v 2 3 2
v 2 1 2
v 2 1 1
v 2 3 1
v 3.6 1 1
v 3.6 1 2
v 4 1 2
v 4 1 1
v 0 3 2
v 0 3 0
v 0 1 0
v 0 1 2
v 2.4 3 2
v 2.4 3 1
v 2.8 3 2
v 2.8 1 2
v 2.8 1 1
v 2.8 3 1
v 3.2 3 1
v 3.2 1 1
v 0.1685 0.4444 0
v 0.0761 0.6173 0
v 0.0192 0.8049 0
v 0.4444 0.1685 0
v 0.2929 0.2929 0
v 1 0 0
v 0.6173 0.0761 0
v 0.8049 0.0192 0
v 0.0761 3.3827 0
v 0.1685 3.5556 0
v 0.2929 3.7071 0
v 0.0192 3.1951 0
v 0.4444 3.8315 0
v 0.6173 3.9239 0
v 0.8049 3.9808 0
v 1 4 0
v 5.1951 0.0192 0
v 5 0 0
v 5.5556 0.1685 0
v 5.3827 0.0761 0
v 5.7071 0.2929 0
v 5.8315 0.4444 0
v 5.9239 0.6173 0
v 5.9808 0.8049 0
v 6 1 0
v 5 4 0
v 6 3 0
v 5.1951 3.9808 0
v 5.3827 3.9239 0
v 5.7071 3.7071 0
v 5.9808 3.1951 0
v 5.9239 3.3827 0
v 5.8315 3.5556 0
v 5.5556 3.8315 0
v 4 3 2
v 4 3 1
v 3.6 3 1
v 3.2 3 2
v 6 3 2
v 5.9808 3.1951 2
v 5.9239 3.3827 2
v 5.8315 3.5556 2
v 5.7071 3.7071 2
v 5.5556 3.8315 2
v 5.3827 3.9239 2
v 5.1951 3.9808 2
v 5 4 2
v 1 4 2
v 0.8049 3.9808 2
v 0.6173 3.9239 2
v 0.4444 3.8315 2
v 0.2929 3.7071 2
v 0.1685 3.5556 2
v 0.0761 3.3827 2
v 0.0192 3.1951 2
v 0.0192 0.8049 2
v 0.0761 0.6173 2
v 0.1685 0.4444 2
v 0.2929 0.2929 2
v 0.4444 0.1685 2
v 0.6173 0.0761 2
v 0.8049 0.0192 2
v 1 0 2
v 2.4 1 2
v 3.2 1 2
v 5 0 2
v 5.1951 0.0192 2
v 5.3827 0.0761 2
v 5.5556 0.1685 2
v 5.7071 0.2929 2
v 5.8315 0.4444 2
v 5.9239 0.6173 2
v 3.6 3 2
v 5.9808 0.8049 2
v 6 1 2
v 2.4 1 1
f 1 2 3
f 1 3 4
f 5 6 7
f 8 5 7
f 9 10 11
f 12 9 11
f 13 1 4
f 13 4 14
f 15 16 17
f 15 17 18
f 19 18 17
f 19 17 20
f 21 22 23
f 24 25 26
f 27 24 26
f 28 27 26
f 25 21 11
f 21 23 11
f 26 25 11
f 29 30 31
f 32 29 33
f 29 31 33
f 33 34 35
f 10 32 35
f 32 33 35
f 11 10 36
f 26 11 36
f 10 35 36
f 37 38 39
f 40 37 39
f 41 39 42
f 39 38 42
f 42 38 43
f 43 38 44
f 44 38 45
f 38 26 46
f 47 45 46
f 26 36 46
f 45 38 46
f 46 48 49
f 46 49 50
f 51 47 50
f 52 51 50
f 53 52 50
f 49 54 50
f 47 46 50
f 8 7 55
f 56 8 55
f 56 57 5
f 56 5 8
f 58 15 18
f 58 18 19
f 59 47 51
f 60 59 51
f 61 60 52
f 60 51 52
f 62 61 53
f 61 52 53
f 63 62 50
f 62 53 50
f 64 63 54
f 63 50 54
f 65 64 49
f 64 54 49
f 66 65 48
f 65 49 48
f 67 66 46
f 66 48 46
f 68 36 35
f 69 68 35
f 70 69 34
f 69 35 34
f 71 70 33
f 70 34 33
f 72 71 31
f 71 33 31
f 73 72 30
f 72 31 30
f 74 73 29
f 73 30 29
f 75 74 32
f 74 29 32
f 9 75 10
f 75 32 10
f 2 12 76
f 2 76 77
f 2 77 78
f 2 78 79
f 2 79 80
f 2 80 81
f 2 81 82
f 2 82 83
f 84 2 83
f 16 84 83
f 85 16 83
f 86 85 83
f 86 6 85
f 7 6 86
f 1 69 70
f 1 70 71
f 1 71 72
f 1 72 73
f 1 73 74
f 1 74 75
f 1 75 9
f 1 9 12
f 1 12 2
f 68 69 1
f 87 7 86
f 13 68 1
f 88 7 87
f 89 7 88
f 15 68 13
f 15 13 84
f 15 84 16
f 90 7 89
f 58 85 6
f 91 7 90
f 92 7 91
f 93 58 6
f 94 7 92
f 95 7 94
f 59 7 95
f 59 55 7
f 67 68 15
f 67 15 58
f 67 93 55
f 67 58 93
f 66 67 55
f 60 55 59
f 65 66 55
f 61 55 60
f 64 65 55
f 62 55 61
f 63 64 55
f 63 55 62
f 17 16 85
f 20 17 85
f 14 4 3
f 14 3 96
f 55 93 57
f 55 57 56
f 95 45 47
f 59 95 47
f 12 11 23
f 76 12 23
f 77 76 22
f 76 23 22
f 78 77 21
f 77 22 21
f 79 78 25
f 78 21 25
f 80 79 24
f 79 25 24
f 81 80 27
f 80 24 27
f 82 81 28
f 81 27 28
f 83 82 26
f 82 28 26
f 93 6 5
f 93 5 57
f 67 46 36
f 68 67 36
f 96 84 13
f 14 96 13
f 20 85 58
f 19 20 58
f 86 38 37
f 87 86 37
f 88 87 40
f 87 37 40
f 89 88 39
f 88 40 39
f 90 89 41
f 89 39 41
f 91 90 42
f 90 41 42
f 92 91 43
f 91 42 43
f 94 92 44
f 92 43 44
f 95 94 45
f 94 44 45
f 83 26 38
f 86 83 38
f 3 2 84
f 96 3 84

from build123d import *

# Parameters (mm, degrees)
AUFSATZ_LINEAR_AUSTRAGEN1_DEPTH = 2
SKIZZE2_W                       = 0.4
SKIZZE2_H                       = 2
SCHNITT_LINEAR_AUSTRAGEN1_DEPTH = 1
SKIZZE3_W                       = 0.4
SKIZZE3_H                       = 2
SCHNITT_LINEAR_AUSTRAGEN2_DEPTH = 1
SKIZZE4_W                       = 0.4
SKIZZE4_H                       = 2
SCHNITT_LINEAR_AUSTRAGEN3_DEPTH = 1


with BuildPart() as part:
    # Skizze1 → Aufsatz-Linear austragen1 (new body)
    with BuildSketch(Plane.XY):
        with BuildLine():
            Line((1, 0), (5, 0))
            ThreePointArc((5, 0), (5.707106781, 0.292893219), (6, 1))
            Line((6, 1), (6, 3))
            ThreePointArc((6, 3), (5.707106781, 3.707106781), (5, 4))
            Line((5, 4), (1, 4))
            ThreePointArc((1, 4), (0.292893219, 3.707106781), (0, 3))
            Line((0, 3), (0, 1))
            ThreePointArc((0, 1), (0.292893219, 0.292893219), (1, 0))
        make_face()
    extrude(amount=AUFSATZ_LINEAR_AUSTRAGEN1_DEPTH)

    # Skizze2 → Schnitt-Linear austragen1 (cut)
    with BuildSketch(Plane.XY.offset(2)):
        with Locations((3, 2)):
            Rectangle(SKIZZE2_W, SKIZZE2_H)
    extrude(amount=-SCHNITT_LINEAR_AUSTRAGEN1_DEPTH, mode=Mode.SUBTRACT)

    # Skizze3 → Schnitt-Linear austragen2 (cut)
    with BuildSketch(Plane.XY.offset(2)):
        with Locations((3.8, 2)):
            Rectangle(SKIZZE3_W, SKIZZE3_H)
    extrude(amount=-SCHNITT_LINEAR_AUSTRAGEN2_DEPTH, mode=Mode.SUBTRACT)

    # Skizze4 → Schnitt-Linear austragen3 (cut)
    with BuildSketch(Plane.XY.offset(2)):
        with Locations((2.2, 2)):
            Rectangle(SKIZZE4_W, SKIZZE4_H)
    extrude(amount=-SCHNITT_LINEAR_AUSTRAGEN3_DEPTH, mode=Mode.SUBTRACT)


solid = part.part
